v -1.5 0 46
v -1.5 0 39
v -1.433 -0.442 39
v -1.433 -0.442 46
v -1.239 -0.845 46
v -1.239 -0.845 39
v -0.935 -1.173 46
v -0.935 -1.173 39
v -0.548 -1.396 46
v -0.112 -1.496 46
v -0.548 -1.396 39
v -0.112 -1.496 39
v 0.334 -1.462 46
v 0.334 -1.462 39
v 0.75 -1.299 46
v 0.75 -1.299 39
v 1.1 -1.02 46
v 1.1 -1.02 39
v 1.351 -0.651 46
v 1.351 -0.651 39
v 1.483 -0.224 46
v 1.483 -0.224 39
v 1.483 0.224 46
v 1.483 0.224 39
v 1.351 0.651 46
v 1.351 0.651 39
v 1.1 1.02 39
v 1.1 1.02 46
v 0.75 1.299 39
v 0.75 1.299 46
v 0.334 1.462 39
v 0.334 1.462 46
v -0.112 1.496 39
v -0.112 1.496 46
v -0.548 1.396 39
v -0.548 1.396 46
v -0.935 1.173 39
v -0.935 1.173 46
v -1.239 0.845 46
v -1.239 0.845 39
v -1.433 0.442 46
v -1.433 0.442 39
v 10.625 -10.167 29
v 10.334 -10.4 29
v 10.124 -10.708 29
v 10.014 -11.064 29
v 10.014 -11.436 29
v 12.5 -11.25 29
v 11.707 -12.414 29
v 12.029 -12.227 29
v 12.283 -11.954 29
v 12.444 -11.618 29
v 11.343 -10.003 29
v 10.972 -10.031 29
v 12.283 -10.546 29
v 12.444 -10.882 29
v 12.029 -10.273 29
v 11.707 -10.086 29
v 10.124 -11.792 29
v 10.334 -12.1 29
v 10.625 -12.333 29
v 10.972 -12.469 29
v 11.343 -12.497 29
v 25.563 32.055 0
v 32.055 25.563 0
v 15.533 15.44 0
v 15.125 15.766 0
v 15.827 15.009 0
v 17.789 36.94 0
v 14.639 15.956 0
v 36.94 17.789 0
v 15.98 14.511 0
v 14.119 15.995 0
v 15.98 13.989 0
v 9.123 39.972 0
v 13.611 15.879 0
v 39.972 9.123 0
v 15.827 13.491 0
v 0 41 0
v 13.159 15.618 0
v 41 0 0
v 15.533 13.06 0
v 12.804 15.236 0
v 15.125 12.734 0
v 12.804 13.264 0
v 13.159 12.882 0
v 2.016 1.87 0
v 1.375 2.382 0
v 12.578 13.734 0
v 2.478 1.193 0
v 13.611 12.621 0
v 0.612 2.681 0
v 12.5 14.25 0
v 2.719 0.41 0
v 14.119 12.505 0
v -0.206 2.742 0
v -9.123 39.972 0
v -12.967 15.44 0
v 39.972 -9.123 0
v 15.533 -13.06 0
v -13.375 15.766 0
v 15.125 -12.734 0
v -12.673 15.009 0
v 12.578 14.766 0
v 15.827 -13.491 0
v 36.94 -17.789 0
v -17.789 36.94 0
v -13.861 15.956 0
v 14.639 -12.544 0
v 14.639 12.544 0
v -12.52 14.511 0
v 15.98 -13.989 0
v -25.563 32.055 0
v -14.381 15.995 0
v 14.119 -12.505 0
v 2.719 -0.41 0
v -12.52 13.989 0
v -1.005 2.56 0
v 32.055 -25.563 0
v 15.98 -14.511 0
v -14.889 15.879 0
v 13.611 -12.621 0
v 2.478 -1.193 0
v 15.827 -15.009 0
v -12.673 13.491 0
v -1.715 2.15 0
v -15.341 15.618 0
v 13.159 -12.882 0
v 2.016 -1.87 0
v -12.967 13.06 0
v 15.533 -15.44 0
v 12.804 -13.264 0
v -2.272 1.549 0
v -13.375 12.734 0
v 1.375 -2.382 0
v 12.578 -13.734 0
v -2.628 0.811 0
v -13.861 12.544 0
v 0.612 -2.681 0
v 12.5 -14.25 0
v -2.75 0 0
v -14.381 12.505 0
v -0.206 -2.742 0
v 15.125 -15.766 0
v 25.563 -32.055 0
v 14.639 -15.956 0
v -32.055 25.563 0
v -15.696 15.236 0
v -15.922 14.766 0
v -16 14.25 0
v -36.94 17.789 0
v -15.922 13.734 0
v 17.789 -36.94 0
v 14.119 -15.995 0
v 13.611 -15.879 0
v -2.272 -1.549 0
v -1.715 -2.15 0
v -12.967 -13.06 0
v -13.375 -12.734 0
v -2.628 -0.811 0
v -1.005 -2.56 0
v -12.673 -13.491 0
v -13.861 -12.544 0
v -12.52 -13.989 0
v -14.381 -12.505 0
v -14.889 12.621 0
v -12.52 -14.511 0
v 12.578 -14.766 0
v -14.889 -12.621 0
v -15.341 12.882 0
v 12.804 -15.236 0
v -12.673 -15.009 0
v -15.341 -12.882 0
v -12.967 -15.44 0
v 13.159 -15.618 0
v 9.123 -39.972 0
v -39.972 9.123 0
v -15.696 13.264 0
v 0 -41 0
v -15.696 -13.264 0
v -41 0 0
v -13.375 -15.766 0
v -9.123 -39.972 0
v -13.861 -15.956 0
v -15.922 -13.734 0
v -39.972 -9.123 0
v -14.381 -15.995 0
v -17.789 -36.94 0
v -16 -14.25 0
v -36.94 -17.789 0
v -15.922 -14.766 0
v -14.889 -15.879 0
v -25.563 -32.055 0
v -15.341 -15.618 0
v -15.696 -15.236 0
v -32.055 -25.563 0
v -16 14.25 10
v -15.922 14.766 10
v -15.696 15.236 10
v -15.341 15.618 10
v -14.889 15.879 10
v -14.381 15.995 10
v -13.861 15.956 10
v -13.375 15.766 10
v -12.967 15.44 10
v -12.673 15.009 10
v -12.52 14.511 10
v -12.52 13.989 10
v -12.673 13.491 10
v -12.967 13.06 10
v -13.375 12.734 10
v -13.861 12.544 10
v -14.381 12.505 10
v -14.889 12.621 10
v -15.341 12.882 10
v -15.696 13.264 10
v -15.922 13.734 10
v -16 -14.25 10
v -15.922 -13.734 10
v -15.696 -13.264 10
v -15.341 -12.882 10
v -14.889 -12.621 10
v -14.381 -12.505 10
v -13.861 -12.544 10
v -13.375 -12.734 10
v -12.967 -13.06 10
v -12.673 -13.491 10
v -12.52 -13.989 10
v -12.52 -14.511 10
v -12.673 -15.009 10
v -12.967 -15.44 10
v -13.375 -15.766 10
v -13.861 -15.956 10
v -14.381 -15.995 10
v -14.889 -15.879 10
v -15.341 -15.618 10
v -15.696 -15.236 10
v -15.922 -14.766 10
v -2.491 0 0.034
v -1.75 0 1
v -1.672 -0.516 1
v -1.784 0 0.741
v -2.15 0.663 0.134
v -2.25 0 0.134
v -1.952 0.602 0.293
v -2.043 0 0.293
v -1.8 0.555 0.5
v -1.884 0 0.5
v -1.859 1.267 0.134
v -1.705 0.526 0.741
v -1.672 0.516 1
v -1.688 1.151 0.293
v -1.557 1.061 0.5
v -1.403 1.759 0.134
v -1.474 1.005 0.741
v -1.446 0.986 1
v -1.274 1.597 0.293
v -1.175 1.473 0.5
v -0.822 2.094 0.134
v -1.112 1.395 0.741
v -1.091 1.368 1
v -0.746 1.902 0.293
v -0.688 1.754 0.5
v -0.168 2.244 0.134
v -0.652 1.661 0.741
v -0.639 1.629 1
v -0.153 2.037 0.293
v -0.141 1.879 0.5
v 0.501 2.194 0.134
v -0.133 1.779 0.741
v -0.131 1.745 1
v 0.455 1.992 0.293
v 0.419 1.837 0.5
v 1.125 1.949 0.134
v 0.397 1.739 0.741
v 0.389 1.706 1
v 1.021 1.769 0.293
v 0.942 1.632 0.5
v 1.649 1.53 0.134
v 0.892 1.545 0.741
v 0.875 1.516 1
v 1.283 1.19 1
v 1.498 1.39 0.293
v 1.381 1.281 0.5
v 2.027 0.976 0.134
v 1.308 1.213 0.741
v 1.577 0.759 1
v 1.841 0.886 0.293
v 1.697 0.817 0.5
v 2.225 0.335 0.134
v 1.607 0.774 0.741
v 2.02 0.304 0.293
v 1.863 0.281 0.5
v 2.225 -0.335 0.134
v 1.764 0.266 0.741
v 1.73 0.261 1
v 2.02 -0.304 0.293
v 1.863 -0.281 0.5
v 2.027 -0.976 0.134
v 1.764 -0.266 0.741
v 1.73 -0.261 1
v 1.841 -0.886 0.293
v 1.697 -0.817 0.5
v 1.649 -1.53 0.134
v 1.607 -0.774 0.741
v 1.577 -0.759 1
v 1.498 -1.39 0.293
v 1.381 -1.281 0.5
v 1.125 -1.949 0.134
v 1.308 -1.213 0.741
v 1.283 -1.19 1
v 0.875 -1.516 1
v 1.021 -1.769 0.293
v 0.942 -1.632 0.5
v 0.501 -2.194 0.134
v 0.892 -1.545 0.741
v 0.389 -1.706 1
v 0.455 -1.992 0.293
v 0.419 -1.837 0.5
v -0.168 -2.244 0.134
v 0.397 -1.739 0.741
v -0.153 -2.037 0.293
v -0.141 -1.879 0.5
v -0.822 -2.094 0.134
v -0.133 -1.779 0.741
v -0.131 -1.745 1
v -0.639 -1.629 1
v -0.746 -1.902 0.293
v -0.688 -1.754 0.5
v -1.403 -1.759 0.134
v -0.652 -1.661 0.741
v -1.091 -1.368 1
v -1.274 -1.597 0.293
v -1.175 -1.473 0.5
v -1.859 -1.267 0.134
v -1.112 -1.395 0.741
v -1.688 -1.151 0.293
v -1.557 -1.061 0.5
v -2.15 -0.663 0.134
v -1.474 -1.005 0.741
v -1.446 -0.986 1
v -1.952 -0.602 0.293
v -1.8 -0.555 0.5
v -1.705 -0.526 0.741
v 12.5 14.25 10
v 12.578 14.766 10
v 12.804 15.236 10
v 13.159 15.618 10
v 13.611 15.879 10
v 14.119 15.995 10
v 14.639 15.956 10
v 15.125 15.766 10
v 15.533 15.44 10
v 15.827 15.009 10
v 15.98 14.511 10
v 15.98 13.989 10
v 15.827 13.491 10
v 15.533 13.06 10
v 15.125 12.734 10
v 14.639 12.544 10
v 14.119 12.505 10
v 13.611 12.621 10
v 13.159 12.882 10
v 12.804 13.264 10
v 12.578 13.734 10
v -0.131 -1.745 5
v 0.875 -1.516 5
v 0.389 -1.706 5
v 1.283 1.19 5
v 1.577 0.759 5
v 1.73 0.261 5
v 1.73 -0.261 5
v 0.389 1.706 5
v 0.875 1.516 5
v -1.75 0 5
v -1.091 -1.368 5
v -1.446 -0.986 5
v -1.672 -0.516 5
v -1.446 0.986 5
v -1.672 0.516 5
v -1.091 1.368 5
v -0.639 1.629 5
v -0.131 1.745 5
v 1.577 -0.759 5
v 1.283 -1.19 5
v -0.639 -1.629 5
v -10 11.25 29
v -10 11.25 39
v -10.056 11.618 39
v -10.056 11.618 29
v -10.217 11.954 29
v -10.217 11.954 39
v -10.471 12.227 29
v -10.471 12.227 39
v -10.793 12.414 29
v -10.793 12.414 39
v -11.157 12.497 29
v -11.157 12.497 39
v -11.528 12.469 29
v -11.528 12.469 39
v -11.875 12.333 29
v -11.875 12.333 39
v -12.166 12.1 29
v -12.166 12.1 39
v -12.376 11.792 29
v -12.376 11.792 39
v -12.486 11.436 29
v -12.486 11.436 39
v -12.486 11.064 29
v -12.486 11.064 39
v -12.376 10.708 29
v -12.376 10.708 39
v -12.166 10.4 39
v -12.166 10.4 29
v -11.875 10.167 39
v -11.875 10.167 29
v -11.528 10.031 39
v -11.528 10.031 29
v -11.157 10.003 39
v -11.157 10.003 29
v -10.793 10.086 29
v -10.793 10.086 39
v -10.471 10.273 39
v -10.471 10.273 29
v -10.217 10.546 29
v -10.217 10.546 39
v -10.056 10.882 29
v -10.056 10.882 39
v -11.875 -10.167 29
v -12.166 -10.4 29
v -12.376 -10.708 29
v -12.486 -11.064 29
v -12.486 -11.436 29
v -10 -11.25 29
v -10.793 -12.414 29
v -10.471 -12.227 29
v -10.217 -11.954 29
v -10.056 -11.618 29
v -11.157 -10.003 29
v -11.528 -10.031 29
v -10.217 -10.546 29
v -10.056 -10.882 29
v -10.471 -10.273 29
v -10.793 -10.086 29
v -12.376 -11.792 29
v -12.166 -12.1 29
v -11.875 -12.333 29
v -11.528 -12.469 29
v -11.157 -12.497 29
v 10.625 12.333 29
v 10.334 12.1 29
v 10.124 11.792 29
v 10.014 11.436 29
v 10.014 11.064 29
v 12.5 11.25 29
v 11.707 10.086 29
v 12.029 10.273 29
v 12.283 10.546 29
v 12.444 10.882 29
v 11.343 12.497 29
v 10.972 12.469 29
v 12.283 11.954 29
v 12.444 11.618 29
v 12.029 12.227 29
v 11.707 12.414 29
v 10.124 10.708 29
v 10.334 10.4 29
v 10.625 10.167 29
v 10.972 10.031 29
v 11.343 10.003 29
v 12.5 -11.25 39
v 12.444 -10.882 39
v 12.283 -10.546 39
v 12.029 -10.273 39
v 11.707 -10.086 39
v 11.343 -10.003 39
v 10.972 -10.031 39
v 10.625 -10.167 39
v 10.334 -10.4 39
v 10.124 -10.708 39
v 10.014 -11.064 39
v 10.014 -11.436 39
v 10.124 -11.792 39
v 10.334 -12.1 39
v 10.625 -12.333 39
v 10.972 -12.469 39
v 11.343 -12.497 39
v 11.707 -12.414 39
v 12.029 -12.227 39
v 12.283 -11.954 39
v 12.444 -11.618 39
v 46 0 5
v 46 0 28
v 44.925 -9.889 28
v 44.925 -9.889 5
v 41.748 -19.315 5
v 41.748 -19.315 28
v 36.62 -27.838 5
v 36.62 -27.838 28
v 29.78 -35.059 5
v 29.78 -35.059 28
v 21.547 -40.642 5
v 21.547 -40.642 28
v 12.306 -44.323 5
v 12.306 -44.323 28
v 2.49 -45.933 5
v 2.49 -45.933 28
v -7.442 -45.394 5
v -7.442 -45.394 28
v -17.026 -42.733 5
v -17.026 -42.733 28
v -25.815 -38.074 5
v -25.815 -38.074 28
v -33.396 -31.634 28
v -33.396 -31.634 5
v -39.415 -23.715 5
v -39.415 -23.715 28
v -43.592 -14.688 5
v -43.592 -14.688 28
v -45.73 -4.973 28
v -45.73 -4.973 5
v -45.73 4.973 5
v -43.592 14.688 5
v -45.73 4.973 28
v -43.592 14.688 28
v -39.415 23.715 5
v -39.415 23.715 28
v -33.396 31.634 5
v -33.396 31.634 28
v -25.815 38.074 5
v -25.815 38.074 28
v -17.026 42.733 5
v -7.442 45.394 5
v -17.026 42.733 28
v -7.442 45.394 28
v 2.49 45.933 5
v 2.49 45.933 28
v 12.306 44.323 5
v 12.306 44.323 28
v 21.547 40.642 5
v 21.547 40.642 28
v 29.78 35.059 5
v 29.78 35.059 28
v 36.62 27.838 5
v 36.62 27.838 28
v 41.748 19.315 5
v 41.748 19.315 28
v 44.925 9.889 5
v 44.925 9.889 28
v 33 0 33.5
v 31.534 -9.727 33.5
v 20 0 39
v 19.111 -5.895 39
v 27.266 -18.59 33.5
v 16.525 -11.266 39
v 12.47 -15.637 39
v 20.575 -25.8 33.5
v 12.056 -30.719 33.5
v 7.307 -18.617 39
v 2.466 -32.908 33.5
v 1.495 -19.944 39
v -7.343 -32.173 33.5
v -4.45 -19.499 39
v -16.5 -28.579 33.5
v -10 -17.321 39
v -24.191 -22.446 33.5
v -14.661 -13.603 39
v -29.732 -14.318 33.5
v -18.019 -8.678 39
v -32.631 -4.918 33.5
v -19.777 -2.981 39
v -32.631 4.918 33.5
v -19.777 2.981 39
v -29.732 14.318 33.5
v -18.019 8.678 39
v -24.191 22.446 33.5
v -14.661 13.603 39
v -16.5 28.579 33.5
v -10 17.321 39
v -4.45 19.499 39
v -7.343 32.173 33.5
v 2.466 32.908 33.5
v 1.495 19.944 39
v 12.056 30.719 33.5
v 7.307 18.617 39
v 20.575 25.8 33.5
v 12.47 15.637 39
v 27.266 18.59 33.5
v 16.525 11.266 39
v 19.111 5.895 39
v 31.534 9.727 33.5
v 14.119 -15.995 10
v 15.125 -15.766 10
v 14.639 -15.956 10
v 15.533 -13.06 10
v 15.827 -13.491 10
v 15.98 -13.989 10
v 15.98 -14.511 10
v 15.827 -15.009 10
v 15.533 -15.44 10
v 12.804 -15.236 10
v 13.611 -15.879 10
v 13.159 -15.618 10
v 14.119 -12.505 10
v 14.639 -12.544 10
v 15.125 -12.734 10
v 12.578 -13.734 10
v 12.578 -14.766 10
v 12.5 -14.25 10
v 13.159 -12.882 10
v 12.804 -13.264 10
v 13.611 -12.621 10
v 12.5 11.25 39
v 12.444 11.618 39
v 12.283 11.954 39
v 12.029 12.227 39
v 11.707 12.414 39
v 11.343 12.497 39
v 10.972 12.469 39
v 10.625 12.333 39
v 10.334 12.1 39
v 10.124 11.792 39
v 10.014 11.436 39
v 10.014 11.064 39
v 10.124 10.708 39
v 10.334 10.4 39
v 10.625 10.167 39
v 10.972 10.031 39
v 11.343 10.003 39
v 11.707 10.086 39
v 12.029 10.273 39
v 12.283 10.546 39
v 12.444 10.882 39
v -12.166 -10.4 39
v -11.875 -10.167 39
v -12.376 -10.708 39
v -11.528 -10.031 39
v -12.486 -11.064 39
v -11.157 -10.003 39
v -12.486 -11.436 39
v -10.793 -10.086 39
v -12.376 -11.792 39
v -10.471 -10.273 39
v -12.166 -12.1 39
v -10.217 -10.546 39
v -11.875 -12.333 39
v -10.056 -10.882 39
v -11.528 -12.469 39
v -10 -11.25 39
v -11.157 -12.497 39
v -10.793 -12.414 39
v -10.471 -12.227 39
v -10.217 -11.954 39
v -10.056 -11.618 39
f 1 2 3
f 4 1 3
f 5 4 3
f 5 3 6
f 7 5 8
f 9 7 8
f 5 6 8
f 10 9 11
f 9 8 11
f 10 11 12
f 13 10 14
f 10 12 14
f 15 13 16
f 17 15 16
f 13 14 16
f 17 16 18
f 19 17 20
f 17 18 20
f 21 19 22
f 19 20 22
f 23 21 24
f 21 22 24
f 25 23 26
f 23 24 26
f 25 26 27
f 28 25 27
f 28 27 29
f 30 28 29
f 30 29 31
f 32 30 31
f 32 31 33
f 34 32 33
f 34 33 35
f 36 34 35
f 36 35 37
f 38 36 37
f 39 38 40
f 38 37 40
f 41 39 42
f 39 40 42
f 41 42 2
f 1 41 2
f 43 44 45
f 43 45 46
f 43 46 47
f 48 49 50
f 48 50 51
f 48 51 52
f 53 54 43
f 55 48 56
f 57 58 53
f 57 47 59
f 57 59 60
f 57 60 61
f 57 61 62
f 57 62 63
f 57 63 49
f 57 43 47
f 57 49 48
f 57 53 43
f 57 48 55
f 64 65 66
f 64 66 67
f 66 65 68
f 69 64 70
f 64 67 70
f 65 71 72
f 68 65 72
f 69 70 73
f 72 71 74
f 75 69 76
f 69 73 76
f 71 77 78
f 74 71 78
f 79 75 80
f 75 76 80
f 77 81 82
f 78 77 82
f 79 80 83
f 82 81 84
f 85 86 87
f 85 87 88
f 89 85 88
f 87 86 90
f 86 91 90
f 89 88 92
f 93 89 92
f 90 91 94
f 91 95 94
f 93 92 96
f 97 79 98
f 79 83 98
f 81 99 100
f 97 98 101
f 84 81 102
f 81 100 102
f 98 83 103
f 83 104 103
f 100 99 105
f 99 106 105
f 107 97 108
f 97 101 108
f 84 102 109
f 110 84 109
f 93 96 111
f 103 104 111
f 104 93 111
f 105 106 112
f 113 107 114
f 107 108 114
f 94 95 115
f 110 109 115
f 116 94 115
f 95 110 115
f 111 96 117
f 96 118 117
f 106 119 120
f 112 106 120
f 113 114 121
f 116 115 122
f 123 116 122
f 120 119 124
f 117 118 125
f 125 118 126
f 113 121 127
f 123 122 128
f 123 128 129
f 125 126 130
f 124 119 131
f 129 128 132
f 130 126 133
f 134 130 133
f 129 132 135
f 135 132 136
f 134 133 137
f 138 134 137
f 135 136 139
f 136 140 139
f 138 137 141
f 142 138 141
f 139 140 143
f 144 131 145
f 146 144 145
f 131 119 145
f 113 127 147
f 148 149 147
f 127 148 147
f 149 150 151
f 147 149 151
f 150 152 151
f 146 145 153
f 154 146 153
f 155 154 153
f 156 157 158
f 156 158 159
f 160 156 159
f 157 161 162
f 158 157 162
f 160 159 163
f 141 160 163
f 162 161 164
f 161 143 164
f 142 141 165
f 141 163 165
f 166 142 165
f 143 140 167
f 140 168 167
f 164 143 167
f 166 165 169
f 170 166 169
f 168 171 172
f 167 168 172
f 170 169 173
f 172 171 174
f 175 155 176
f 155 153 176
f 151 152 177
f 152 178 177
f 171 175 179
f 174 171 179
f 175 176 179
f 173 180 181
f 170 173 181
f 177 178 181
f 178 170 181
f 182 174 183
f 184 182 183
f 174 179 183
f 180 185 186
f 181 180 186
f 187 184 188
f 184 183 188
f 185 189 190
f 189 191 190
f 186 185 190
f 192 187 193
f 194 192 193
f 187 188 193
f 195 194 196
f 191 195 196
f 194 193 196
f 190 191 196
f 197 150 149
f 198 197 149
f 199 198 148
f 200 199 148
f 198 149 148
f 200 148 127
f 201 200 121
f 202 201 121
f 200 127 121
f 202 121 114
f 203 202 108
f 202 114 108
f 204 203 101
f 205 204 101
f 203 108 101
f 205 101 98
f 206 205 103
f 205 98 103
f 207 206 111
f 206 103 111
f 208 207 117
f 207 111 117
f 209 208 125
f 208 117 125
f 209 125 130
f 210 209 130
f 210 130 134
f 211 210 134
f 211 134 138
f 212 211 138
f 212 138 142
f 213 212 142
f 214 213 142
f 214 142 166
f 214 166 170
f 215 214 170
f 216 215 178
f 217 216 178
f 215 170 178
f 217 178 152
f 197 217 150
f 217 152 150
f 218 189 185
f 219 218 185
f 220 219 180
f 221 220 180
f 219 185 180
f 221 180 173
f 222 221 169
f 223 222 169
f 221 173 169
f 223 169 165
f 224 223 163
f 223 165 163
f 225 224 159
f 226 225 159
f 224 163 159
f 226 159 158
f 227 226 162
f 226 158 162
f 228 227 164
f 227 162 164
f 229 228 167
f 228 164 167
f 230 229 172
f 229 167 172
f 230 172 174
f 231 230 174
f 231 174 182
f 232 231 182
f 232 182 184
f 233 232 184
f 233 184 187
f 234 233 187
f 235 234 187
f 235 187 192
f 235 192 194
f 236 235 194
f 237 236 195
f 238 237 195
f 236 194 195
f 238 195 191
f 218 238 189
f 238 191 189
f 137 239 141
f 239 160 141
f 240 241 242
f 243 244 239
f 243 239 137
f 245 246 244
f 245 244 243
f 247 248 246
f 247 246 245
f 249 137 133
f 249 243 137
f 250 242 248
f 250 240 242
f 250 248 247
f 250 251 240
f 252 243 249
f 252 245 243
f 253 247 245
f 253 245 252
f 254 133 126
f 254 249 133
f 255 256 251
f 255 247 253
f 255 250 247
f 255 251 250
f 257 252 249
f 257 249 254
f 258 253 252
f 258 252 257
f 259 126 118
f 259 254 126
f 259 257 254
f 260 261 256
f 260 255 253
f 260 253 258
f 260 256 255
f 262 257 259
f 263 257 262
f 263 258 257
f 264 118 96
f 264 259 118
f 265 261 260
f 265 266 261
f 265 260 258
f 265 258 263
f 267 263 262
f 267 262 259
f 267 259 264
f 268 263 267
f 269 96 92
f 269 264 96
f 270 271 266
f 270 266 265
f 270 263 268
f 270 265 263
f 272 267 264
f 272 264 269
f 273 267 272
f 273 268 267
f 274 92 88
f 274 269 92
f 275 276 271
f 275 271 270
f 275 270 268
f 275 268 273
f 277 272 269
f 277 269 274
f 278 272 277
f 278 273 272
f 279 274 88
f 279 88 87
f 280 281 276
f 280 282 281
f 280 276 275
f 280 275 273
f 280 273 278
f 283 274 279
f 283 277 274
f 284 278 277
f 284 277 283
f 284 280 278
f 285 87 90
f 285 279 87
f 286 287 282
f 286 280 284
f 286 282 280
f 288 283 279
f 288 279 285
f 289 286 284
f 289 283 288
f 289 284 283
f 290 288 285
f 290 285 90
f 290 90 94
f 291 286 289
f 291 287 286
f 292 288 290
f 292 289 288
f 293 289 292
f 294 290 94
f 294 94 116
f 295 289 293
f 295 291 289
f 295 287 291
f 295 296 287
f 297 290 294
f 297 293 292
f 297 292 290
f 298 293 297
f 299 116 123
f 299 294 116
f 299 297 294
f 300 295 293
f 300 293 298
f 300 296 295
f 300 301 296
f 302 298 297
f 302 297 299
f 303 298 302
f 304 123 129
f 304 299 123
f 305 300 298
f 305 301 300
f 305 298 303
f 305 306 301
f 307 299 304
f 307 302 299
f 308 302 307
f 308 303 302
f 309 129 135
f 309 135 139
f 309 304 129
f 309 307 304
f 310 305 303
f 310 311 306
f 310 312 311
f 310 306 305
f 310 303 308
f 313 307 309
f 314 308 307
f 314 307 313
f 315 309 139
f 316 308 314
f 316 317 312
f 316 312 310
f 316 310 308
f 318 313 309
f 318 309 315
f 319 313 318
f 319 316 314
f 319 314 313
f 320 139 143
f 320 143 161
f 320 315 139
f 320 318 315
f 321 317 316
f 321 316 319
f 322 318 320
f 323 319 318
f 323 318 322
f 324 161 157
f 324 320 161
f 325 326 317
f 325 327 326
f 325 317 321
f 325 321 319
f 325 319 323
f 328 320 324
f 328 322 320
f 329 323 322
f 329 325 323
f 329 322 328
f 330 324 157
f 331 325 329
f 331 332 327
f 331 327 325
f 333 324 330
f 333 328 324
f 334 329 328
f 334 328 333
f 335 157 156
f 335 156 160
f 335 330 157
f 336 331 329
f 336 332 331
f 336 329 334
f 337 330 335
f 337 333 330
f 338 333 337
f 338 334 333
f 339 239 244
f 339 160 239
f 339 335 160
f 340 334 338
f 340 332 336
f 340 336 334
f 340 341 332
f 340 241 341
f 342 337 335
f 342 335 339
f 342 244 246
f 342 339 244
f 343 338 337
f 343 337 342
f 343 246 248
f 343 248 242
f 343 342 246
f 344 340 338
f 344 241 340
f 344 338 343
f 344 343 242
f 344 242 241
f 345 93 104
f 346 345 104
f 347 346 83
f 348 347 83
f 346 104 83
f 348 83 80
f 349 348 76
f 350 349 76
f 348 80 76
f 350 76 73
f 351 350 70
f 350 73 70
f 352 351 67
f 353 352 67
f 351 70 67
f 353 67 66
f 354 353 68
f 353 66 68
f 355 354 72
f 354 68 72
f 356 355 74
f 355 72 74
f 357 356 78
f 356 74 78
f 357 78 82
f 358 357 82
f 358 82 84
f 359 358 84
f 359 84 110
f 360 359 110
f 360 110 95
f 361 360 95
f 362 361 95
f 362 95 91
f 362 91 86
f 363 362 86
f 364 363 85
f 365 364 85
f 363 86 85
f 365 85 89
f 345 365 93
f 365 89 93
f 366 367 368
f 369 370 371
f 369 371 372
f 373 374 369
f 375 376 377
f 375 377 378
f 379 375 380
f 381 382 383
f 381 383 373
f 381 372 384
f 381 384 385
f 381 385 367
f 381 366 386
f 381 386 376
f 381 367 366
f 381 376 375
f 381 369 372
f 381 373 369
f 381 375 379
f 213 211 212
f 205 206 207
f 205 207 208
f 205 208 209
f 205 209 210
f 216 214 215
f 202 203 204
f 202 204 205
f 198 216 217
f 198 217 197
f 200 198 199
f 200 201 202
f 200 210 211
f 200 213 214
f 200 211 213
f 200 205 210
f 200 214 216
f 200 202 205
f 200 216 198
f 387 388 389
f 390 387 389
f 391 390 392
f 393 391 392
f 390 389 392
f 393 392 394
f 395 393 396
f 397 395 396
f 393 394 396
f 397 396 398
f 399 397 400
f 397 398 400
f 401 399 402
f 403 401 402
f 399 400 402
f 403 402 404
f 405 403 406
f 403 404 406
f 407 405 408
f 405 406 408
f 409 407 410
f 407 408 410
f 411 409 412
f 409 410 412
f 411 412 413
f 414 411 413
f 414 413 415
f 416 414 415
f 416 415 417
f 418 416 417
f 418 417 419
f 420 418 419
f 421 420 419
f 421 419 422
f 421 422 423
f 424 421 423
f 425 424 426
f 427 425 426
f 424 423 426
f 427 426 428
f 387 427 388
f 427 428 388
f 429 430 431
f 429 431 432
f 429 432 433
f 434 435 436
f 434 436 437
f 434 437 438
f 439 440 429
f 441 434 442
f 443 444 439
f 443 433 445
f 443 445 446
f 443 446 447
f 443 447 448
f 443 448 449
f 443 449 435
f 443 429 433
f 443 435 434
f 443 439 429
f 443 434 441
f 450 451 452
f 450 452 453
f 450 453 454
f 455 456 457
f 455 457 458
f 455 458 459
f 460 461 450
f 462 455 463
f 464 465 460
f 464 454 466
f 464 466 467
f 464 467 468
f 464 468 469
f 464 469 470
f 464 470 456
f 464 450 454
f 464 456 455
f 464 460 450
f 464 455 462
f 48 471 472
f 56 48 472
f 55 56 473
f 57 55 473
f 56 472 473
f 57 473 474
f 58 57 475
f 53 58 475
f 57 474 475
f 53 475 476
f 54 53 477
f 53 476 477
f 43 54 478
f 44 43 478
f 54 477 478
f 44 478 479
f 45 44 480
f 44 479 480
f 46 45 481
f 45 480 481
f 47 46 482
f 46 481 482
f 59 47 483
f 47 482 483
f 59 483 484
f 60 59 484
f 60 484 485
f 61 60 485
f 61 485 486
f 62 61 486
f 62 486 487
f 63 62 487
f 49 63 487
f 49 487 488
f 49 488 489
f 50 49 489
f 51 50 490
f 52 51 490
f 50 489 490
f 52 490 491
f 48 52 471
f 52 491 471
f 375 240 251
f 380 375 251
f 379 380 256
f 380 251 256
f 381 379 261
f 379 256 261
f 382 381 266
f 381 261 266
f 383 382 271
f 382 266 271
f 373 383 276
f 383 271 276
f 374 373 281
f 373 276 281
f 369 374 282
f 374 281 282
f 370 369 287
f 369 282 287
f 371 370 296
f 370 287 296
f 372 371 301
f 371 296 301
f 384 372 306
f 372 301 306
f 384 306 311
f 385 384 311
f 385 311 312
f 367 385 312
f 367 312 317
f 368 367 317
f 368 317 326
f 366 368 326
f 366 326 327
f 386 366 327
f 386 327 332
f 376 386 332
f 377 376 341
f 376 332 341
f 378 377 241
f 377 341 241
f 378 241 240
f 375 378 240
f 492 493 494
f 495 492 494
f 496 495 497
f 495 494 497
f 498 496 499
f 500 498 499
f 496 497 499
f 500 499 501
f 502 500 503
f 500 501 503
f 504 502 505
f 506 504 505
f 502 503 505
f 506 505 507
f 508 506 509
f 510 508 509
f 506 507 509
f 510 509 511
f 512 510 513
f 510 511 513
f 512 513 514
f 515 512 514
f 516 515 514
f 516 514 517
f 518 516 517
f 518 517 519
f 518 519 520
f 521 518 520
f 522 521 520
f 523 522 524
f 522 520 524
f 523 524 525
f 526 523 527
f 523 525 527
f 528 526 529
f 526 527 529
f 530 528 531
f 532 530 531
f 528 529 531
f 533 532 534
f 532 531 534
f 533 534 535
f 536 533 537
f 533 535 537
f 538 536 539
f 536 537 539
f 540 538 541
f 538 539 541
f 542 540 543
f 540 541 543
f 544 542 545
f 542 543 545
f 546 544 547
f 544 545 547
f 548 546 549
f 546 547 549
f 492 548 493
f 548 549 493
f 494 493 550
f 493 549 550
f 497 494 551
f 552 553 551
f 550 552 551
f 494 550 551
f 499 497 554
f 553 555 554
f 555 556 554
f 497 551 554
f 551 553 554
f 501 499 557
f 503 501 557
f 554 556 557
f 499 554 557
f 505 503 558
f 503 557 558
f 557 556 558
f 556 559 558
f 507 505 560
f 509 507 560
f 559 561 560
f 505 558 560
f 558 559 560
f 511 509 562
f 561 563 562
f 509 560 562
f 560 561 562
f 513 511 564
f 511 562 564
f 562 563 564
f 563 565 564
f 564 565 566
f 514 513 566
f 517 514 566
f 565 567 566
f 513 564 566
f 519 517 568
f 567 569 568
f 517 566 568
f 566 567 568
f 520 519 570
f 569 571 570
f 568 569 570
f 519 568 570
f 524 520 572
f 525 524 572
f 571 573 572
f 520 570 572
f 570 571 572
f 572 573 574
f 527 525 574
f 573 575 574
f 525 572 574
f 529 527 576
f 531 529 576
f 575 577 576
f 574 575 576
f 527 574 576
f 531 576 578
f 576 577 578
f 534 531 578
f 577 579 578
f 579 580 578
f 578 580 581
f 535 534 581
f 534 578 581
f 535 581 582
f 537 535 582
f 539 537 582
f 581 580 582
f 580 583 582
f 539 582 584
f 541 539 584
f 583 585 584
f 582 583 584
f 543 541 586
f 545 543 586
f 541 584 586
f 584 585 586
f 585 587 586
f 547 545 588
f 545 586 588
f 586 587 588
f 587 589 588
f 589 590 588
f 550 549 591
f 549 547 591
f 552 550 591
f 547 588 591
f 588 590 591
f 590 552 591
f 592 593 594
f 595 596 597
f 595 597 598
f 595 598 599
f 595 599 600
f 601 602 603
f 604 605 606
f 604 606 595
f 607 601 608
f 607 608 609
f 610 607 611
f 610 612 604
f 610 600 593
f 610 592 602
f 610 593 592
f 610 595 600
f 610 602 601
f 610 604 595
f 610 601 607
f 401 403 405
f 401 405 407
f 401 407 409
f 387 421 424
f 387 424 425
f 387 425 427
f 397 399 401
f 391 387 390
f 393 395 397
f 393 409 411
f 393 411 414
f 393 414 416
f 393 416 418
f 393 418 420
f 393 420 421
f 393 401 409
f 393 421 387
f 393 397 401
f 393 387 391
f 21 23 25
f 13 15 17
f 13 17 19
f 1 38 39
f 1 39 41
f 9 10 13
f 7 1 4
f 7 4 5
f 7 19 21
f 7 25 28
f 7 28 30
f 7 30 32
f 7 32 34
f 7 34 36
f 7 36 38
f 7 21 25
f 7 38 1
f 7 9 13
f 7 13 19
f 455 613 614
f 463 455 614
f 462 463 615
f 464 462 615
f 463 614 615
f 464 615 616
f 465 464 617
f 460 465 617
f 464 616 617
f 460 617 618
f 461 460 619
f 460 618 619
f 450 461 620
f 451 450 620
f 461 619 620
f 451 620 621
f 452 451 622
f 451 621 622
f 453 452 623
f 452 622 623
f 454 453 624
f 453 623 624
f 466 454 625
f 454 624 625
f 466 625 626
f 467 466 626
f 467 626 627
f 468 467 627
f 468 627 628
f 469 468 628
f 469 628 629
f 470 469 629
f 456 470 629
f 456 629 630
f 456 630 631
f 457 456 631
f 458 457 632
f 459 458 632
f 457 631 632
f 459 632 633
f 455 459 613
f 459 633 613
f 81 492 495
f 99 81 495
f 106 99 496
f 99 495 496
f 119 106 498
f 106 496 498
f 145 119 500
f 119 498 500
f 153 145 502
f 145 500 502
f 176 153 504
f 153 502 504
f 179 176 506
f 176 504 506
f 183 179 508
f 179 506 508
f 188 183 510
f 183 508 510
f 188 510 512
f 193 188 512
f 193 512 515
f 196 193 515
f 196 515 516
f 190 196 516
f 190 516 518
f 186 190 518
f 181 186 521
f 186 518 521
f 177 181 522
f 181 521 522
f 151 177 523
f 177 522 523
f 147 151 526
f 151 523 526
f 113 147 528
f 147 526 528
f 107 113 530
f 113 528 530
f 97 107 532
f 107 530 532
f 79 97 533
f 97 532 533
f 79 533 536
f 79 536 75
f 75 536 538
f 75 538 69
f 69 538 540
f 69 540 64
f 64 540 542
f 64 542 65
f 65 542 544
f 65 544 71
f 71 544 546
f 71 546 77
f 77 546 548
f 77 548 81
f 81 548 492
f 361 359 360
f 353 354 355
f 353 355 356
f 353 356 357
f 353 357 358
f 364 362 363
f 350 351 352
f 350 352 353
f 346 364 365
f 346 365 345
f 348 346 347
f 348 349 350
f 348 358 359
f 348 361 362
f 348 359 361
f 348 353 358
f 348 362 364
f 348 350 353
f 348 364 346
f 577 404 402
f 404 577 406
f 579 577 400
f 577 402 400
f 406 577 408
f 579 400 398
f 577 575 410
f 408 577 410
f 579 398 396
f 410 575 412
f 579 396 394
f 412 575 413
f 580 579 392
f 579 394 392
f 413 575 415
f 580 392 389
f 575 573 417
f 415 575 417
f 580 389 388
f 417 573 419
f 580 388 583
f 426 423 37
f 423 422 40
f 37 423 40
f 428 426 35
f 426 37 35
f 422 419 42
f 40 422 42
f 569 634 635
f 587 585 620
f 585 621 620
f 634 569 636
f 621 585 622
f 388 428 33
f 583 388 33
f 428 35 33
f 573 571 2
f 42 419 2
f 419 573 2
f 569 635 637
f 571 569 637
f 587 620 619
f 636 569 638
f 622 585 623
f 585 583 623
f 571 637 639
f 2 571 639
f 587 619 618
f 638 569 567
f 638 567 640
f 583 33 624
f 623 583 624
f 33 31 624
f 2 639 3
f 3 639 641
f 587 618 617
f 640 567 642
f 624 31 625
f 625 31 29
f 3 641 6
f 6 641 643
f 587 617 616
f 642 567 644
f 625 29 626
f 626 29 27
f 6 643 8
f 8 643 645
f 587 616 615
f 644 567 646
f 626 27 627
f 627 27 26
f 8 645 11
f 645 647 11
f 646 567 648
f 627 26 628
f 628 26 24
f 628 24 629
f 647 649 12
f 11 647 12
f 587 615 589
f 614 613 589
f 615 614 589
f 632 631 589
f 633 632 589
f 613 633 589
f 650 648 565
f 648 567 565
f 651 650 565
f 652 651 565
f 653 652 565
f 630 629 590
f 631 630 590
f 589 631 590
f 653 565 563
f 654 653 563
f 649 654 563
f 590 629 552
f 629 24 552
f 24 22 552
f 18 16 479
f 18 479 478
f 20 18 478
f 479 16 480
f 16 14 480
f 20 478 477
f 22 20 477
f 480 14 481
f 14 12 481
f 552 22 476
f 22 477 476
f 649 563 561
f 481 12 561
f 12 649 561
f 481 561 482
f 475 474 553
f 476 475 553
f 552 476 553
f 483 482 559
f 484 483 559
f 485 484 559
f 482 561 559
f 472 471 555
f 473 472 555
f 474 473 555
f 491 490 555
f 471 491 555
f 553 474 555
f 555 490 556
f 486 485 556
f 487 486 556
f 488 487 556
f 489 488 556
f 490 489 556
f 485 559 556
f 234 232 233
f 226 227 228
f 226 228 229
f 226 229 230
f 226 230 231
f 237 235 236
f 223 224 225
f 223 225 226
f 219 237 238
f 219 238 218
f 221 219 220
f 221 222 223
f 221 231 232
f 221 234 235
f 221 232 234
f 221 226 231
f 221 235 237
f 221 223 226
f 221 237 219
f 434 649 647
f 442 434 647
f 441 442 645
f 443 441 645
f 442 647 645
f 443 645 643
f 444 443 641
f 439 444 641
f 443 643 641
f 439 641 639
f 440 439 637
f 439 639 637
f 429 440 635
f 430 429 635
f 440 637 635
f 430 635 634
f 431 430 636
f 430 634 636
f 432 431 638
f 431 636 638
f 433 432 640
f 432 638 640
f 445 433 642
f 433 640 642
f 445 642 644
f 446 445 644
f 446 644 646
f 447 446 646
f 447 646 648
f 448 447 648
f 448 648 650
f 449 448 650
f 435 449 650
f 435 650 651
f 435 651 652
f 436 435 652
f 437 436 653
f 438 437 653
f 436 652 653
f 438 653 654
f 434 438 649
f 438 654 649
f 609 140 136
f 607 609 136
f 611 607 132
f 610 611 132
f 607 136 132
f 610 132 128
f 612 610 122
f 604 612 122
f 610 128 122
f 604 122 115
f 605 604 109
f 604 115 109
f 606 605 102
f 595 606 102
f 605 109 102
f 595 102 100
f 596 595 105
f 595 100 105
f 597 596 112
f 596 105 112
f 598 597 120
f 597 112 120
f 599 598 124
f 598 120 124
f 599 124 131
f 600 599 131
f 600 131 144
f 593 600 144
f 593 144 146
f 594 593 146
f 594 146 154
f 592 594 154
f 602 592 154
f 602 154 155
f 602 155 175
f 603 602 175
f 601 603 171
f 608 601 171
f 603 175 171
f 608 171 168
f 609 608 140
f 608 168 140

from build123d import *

# Parameters (mm, degrees)
SKETCH2_R          = 1.25
ROTOR_HOLES_DEPTH  = 10
SKETCH4_R          = 1.75
STATOR_HOLES_DEPTH = 10
SKETCH5_R          = 1.75
HOLE_DEPTH         = 5
FILLET1_R          = 1
SKETCH6_R          = 1.5
SHAFT_DEPTH        = 7
CHAMFER1_SIZE      = 5


with BuildPart() as part:
    # Sketch1 → Body (revolve)
    with BuildSketch(Plane(origin=(0, 0, 0), x_dir=(0, 0, -1), z_dir=(1, 0, 0)), mode=Mode.PRIVATE) as body_sk:
        Polygon((0, 46), (-28, 46), (-39, 20), (-39, 0), (0, 0), align=None)
    revolve(body_sk.sketch.rotate(Axis((0, 0, 1764.481038956), (0, 0, -1)), 90), axis=Axis((0, 0, 1764.481038956), (0, 0, -1)))

    # Sketch2 → Rotor_Holes (cut)
    with BuildSketch(Plane.XY.offset(39)):
        with Locations((-11.25, 11.25)):
            Circle(SKETCH2_R)
        with Locations((11.25, 11.25)):
            Circle(SKETCH2_R)
        with Locations((11.25, -11.25)):
            Circle(SKETCH2_R)
        with Locations((-11.25, -11.25)):
            Circle(SKETCH2_R)
    extrude(amount=-ROTOR_HOLES_DEPTH, mode=Mode.SUBTRACT)

    # Sketch4 → Stator_Holes (cut)
    with BuildSketch(Plane(origin=(0, 0, 0), x_dir=(-1, 0, 0), z_dir=(0, 0, -1))):
        with Locations((-14.25, 14.25)):
            Circle(SKETCH4_R)
        with Locations((14.25, 14.25)):
            Circle(SKETCH4_R)
        with Locations((14.25, -14.25)):
            Circle(SKETCH4_R)
        with Locations((-14.25, -14.25)):
            Circle(SKETCH4_R)
    extrude(amount=-STATOR_HOLES_DEPTH, mode=Mode.SUBTRACT)

    # Sketch5 → Hole (cut)
    with BuildSketch(Plane(origin=(0, 0, 0), x_dir=(-1, 0, 0), z_dir=(0, 0, -1))):
        Circle(SKETCH5_R)
    extrude(amount=-HOLE_DEPTH, mode=Mode.SUBTRACT)

    # Fillet1
    fillet1_edges = [part.edges().sort_by_distance(p)[0] for p in [
        (1.75, 0, 0),
    ]]
    fillet(fillet1_edges, radius=FILLET1_R)

    # Sketch6 → Shaft (add)
    with BuildSketch(Plane.XY.offset(39)):
        with Locations(Location((0, 0, 0), (0, 0, 180))):
            Circle(SKETCH6_R)
    extrude(amount=SHAFT_DEPTH)

    # Chamfer1
    chamfer1_edges = [part.edges().sort_by_distance(p)[0] for p in [
        (-46, 0, 0),
    ]]
    chamfer(chamfer1_edges, length=CHAMFER1_SIZE)


solid = part.part
